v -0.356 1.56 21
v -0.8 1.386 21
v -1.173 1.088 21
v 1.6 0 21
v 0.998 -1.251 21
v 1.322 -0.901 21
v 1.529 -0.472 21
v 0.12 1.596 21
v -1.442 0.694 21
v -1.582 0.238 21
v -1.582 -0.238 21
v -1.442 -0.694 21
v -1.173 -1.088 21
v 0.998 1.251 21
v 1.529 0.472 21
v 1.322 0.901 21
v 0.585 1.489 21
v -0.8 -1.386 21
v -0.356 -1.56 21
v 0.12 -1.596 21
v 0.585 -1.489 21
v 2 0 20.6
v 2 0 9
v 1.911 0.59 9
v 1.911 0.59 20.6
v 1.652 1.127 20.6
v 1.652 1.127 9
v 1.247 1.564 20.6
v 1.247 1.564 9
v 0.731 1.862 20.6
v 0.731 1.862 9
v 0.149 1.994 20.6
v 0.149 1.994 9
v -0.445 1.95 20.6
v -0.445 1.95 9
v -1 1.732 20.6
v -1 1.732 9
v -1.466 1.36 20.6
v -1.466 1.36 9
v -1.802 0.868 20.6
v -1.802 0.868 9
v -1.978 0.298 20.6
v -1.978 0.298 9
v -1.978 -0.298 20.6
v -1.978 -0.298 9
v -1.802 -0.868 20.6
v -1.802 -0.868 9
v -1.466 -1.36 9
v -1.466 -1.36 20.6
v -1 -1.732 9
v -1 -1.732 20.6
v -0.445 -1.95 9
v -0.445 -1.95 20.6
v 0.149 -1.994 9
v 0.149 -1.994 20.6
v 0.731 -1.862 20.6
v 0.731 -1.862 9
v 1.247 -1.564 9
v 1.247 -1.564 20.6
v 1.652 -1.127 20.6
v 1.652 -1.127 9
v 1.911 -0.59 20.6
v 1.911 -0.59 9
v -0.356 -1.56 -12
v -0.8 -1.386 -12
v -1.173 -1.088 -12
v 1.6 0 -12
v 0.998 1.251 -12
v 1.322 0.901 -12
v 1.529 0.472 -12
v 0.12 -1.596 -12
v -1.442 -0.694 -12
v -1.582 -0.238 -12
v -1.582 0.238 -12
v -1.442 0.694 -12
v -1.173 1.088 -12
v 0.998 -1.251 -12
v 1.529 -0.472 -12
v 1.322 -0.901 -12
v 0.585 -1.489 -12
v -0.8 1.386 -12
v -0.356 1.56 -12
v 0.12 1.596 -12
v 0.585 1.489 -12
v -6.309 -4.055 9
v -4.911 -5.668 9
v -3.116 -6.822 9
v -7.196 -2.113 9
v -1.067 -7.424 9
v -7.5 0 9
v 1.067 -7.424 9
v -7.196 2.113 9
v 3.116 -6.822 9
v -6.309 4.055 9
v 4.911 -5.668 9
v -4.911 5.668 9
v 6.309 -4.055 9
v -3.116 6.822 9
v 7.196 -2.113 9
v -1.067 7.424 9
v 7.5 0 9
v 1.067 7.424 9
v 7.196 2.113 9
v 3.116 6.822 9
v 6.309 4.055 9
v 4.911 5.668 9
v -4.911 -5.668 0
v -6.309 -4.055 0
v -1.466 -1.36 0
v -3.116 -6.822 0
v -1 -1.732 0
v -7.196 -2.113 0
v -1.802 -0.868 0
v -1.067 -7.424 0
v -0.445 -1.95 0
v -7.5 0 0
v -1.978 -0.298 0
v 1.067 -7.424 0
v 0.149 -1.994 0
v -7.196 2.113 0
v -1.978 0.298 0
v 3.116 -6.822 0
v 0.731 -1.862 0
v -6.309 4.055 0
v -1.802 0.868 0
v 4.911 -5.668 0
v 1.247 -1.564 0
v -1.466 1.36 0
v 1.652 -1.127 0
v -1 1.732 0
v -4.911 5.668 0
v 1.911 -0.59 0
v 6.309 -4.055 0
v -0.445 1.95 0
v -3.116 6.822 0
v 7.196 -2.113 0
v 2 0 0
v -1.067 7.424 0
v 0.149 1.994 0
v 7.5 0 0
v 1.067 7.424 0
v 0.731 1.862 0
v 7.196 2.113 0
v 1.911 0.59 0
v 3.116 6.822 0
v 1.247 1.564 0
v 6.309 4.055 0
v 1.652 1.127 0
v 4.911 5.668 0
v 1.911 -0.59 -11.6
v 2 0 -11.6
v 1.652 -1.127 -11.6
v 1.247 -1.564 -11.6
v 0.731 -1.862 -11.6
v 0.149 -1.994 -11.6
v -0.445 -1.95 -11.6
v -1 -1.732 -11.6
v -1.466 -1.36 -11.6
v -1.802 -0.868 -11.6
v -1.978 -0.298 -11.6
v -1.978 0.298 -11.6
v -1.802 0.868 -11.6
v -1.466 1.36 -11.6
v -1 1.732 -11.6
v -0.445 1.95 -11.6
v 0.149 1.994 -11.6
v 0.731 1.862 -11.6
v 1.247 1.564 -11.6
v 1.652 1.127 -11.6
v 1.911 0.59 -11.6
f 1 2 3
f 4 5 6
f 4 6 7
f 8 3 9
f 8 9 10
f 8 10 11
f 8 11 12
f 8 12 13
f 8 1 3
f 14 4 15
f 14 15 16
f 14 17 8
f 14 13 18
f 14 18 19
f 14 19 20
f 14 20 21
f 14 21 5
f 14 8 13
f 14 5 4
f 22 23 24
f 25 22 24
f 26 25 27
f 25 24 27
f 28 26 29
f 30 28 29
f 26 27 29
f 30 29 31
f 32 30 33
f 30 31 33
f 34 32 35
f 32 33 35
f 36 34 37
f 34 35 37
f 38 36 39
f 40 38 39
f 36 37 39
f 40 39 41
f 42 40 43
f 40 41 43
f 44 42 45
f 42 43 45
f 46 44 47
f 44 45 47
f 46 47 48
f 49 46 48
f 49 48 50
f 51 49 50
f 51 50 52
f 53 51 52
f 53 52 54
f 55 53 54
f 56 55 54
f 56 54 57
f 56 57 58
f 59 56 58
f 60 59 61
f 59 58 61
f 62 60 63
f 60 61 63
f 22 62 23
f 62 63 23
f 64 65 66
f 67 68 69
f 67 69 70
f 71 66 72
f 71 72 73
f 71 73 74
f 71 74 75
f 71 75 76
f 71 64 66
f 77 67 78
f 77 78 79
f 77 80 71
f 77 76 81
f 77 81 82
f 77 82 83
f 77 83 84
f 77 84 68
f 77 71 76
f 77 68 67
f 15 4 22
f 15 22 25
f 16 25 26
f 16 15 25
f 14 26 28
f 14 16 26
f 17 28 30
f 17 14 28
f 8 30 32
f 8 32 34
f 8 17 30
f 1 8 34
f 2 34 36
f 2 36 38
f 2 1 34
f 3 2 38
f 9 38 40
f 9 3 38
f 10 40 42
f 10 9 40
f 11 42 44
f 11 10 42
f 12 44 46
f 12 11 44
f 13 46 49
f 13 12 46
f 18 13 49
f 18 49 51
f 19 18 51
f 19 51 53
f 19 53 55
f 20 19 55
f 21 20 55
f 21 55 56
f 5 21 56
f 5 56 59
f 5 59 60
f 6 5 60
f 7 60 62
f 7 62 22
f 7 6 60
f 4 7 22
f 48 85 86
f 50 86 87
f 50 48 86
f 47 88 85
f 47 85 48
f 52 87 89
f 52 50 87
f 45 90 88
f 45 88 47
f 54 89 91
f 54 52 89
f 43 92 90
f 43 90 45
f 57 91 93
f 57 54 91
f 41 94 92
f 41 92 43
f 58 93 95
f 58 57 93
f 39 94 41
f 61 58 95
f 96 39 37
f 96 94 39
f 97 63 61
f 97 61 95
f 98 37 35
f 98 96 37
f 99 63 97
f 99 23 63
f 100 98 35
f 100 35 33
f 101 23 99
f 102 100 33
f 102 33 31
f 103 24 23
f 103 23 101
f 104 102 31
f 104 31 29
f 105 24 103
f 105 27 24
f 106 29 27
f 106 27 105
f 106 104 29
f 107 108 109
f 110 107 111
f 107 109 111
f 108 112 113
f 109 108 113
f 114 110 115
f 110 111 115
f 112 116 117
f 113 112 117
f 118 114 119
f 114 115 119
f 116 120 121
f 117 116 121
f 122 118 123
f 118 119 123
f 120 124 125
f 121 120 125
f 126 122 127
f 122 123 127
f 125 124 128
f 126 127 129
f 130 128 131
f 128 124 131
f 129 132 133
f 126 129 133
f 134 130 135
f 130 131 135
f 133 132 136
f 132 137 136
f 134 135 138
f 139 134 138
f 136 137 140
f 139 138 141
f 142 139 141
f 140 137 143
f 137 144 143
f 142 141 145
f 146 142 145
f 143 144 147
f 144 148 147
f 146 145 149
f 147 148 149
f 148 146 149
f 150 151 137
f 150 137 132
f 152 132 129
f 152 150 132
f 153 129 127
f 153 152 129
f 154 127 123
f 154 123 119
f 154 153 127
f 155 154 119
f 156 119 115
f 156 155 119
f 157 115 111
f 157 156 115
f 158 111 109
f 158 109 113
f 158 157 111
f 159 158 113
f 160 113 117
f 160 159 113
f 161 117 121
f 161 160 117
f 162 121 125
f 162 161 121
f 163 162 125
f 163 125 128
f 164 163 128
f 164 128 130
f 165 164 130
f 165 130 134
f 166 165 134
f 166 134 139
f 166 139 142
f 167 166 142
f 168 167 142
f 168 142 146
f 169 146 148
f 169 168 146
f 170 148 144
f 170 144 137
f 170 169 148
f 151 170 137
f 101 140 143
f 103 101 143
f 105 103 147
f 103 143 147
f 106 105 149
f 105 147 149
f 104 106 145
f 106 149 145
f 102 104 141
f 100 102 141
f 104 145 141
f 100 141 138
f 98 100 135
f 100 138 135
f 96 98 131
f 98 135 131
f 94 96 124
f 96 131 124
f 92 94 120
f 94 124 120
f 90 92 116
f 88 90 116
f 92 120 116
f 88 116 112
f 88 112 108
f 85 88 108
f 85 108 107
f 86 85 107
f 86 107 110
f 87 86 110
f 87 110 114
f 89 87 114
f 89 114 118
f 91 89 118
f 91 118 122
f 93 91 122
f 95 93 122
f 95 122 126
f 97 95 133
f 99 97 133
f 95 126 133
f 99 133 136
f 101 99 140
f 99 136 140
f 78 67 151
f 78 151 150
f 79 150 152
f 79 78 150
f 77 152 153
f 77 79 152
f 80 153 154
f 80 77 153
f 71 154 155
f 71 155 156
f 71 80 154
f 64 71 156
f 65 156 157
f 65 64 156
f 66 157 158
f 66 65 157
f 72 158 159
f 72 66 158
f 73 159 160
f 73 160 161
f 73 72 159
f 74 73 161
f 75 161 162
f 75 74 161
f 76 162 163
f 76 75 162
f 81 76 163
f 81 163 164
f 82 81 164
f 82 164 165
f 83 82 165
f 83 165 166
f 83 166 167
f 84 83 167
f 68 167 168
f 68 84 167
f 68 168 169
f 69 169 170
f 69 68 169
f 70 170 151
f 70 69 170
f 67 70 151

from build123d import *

# Parameters (mm, degrees)
ESQUISSE1_R      = 7.5
EXTRUSION1_DEPTH = 9
ESQUISSE2_R      = 2
EXTRUSION2_DEPTH = 12
EXTRUSION3_START = 12
ESQUISSE3_R      = 2
EXTRUSION3_DEPTH = 12
CHANFREIN1_SIZE  = 0.4


with BuildPart() as part:
    # Esquisse1 → Extrusion1 (new body)
    with BuildSketch(Plane.XY):
        Circle(ESQUISSE1_R)
    extrude(amount=EXTRUSION1_DEPTH)

    # Esquisse2 → Extrusion2 (add)
    with BuildSketch(Plane.XY.offset(9)):
        Circle(ESQUISSE2_R)
    extrude(amount=EXTRUSION2_DEPTH)

    # Esquisse3 → Extrusion3 (add)
    with BuildSketch(Plane(origin=(0, 0, 0), x_dir=(-1, 0, 0), z_dir=(0, 0, -1)).offset(EXTRUSION3_START)):
        with Locations(Location((0, 0, 0), (0, 0, 180))):
            Circle(ESQUISSE3_R)
    extrude(amount=-EXTRUSION3_DEPTH)

    # Chanfrein1
    chanfrein1_edges = [part.edges().sort_by_distance(p)[0] for p in [
        (-2, 0, -12),
        (-2, 0, 21),
    ]]
    chamfer(chanfrein1_edges, length=CHANFREIN1_SIZE)


solid = part.part
